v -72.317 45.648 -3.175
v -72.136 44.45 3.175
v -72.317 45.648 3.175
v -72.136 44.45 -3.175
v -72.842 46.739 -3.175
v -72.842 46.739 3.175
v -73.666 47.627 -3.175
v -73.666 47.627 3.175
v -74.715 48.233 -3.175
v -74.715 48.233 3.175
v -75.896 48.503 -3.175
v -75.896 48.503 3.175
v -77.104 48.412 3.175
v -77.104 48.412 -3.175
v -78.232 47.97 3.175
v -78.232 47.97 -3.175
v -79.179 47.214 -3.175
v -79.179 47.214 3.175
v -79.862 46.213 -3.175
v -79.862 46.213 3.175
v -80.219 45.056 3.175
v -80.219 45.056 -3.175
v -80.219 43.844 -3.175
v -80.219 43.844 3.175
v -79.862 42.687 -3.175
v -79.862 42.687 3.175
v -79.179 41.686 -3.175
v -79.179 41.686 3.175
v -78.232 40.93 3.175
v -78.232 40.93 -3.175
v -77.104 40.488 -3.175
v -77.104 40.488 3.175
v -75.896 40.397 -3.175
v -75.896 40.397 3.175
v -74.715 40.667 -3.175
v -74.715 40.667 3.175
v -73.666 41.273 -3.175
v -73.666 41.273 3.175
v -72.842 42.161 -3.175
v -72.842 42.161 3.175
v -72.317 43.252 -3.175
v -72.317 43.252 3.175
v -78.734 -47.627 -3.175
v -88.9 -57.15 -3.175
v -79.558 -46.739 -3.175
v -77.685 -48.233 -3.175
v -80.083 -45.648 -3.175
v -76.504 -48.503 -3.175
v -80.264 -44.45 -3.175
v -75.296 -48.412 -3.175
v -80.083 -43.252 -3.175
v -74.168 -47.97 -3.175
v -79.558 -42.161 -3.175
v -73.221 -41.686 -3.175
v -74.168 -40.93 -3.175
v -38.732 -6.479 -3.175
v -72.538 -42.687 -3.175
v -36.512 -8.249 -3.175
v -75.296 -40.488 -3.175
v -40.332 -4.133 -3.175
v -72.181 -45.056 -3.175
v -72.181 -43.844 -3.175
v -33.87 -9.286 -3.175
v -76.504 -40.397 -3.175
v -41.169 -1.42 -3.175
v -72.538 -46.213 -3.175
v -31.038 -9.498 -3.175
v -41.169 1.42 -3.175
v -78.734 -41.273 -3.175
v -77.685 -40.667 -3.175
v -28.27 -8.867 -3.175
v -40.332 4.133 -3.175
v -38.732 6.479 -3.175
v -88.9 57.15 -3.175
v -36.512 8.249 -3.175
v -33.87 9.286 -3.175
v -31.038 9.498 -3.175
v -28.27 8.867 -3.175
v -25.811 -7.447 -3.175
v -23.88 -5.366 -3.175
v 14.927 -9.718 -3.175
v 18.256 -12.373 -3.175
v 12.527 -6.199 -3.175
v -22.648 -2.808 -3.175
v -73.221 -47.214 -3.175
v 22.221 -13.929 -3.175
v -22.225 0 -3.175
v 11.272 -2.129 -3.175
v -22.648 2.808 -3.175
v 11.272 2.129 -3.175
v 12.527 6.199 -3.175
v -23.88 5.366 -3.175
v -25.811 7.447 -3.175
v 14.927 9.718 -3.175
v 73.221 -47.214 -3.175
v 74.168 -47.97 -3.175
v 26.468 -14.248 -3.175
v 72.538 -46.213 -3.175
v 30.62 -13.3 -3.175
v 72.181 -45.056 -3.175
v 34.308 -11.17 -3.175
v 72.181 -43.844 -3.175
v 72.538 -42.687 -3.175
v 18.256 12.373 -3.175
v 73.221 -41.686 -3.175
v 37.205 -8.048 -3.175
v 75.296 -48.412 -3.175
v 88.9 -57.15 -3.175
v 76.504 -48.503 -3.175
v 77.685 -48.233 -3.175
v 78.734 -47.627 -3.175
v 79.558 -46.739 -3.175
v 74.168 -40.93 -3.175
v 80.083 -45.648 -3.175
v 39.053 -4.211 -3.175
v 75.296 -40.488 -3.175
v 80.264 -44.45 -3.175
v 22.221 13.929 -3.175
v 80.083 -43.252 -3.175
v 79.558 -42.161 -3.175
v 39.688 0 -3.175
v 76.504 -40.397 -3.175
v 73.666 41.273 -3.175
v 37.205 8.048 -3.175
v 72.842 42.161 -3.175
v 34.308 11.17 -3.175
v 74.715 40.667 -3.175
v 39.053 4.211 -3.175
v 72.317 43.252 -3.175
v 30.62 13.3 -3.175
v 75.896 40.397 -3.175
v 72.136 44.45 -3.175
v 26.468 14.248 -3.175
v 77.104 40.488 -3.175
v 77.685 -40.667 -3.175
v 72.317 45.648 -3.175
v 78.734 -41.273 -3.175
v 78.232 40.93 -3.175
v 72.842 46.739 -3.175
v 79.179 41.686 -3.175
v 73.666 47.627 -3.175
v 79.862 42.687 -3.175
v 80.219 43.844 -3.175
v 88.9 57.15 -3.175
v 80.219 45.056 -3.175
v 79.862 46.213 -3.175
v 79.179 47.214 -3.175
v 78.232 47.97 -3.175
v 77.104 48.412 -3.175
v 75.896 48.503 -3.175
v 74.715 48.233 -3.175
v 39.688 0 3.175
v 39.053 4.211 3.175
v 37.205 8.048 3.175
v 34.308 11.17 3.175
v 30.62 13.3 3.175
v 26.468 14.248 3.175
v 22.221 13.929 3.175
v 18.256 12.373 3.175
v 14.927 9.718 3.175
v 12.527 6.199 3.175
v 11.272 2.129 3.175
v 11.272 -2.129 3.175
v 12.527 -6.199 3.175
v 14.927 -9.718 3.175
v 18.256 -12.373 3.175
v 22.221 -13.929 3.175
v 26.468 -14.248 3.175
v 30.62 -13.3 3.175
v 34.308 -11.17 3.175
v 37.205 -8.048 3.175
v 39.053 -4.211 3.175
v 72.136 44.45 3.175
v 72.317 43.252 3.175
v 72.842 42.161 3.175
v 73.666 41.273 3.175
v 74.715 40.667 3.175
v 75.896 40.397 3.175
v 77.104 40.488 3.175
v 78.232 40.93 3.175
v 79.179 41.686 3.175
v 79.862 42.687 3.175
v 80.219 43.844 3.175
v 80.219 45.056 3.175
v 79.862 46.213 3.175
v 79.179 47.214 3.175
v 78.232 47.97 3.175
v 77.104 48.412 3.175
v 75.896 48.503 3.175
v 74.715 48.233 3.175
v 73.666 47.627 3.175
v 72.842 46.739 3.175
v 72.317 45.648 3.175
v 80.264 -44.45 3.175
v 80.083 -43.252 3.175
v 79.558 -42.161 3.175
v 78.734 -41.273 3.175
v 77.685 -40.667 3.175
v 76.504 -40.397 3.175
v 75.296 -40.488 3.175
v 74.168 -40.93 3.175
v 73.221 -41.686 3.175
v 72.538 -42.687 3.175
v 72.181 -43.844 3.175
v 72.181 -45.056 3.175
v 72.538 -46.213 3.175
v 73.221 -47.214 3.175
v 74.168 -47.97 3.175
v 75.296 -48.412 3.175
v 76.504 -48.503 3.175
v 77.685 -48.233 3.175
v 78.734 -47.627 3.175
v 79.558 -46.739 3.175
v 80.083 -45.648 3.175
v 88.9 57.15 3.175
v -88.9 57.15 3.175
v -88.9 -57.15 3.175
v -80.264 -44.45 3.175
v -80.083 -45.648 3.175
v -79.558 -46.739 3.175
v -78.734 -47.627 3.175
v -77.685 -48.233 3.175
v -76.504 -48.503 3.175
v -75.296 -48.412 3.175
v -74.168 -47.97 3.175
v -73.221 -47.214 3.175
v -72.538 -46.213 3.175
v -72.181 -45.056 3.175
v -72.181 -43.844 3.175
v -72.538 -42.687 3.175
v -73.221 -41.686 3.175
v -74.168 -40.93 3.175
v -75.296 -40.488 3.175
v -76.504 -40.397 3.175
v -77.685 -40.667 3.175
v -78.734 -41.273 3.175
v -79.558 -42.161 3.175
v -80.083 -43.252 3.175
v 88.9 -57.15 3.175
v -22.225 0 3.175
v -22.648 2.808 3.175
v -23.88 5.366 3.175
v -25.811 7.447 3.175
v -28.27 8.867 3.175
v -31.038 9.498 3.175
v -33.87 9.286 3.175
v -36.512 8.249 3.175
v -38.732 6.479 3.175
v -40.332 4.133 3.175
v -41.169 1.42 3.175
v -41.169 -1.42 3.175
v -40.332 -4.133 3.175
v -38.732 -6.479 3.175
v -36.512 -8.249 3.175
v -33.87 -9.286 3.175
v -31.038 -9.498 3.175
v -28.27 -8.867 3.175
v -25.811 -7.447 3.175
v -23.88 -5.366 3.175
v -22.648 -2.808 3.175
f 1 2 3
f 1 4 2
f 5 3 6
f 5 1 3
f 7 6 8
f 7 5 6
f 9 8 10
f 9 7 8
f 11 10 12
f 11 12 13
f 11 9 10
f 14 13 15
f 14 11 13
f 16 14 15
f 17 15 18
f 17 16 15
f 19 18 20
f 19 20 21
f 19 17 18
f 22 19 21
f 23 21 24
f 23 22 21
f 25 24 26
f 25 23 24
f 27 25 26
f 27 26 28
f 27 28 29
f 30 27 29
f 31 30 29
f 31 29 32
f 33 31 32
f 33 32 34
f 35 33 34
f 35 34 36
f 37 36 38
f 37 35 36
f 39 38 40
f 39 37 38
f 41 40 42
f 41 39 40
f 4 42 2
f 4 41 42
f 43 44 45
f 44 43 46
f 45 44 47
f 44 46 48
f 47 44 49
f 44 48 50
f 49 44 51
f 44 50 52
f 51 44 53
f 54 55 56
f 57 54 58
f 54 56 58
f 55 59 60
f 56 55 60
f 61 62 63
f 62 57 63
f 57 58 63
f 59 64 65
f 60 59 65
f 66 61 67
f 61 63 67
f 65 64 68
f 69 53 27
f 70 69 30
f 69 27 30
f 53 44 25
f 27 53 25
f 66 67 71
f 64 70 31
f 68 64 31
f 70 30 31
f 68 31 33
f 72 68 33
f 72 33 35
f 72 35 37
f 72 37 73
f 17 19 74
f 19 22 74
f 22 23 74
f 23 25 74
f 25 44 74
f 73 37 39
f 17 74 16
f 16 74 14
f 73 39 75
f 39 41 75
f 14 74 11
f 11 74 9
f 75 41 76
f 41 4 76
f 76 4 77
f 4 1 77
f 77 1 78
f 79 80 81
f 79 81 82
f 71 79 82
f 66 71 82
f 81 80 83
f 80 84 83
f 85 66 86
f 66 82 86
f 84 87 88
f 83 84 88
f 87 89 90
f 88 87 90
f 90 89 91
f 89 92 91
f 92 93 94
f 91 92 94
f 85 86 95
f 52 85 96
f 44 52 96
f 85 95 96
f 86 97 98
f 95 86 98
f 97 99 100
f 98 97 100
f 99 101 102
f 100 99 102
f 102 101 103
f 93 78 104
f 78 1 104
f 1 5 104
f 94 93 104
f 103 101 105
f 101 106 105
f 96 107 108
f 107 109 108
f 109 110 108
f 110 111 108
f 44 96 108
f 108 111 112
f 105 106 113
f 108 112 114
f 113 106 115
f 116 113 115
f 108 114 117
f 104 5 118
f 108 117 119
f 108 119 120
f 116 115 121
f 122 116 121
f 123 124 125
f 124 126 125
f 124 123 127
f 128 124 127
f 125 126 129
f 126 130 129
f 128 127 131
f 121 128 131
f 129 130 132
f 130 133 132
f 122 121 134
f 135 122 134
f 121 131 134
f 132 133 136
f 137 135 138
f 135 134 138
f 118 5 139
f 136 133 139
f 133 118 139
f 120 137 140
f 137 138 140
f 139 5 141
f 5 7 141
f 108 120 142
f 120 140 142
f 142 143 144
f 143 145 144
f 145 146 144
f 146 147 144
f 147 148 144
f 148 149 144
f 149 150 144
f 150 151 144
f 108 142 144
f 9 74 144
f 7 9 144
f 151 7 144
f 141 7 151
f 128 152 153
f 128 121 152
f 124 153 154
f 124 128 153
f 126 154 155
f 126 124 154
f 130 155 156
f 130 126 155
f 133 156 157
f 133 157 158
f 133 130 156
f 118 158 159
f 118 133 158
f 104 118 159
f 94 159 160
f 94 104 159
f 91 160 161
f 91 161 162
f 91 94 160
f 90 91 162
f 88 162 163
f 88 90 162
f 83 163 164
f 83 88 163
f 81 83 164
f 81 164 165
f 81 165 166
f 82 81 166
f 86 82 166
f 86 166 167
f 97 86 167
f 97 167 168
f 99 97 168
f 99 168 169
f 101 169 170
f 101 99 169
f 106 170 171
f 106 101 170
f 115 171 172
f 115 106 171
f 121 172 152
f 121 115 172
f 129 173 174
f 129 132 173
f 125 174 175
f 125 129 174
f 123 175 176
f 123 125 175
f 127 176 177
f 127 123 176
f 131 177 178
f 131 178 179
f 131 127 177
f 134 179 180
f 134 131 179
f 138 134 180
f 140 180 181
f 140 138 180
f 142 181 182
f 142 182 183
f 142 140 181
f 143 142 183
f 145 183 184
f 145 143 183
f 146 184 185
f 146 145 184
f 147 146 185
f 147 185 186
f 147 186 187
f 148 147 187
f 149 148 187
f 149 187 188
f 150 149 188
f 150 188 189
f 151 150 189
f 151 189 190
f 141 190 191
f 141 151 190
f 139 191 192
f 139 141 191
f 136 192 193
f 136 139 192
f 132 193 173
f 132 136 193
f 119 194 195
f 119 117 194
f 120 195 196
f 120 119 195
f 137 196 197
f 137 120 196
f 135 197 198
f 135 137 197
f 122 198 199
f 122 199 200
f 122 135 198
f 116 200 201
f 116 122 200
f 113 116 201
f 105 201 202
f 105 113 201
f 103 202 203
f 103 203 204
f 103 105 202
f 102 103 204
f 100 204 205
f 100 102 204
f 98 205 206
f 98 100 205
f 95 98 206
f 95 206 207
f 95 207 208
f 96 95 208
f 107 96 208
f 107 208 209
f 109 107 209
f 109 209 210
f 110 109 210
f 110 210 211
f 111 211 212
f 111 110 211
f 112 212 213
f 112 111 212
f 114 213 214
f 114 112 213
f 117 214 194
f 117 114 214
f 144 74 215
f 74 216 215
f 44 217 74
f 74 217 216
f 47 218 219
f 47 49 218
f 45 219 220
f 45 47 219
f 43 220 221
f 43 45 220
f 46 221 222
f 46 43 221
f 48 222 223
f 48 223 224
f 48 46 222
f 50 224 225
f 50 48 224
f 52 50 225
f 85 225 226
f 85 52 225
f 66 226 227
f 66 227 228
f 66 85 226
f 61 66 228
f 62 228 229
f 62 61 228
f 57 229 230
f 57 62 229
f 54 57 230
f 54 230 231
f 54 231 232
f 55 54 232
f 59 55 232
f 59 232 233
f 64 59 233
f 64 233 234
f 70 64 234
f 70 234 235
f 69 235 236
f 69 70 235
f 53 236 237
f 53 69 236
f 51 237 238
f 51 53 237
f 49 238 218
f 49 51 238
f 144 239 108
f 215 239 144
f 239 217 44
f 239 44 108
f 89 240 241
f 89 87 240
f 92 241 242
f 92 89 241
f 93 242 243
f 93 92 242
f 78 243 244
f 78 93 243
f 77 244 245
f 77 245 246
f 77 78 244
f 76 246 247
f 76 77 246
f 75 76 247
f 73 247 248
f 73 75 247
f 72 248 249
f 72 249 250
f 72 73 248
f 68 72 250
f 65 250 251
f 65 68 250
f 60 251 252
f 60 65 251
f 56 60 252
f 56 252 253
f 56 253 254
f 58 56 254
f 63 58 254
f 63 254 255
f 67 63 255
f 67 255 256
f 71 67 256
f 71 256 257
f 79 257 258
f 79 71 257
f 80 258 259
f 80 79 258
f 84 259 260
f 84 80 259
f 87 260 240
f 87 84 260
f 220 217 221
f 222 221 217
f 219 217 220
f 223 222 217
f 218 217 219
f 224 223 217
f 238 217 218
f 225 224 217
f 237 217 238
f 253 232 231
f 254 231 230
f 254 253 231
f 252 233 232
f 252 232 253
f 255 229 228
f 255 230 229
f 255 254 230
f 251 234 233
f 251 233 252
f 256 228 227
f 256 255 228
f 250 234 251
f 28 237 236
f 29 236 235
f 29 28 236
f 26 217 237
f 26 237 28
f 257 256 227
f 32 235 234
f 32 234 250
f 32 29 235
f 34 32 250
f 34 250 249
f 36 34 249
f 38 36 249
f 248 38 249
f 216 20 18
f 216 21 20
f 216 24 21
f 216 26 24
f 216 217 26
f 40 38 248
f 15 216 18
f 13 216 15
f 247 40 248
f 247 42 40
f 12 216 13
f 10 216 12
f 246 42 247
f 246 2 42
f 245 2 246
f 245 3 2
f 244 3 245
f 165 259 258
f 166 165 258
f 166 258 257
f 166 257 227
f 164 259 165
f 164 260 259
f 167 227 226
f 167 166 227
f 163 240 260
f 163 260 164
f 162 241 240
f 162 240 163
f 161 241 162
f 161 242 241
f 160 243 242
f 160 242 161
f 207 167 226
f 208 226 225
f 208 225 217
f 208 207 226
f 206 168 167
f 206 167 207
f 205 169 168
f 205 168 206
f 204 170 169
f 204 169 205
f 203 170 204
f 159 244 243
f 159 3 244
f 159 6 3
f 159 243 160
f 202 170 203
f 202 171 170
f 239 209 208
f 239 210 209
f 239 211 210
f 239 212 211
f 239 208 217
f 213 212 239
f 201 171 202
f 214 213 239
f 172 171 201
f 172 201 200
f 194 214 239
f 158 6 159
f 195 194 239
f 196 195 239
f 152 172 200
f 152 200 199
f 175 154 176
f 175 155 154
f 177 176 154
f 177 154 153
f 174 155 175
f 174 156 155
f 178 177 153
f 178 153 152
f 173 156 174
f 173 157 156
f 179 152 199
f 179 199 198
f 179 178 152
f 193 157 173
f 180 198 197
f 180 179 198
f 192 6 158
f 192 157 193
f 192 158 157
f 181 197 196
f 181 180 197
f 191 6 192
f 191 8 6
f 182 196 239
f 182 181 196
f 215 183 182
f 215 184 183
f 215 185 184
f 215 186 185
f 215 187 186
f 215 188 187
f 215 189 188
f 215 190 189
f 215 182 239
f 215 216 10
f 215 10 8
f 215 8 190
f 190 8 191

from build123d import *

# Parameters (mm, degrees)
SKETCH1_W           = 177.8
SKETCH1_H           = 114.3
SKETCH1_R           = 14.2875
SKETCH1_R_2         = 9.525
SKETCH1_R_3         = 4.064
BOSS_EXTRUDE1_DEPTH = 3.175


with BuildPart() as part:
    # Sketch1 → Boss-Extrude1 (new, symmetric)
    with BuildSketch(Plane.XY):
        Rectangle(SKETCH1_W, SKETCH1_H)
        with Locations((25.4, 0)):
            Circle(SKETCH1_R, mode=Mode.SUBTRACT)
        with Locations((-31.75, 0)):
            Circle(SKETCH1_R_2, mode=Mode.SUBTRACT)
        with Locations((-76.2, 44.45)):
            Circle(SKETCH1_R_3, mode=Mode.SUBTRACT)
        with Locations(Location((-76.2, -44.45, 0), (0, 0, 180))):
            Circle(SKETCH1_R_3, mode=Mode.SUBTRACT)
        with Locations(Location((76.2, 44.45, 0), (0, 0, 180))):
            Circle(SKETCH1_R_3, mode=Mode.SUBTRACT)
        with Locations((76.2, -44.45)):
            Circle(SKETCH1_R_3, mode=Mode.SUBTRACT)
    extrude(amount=BOSS_EXTRUDE1_DEPTH, both=True)


solid = part.part
